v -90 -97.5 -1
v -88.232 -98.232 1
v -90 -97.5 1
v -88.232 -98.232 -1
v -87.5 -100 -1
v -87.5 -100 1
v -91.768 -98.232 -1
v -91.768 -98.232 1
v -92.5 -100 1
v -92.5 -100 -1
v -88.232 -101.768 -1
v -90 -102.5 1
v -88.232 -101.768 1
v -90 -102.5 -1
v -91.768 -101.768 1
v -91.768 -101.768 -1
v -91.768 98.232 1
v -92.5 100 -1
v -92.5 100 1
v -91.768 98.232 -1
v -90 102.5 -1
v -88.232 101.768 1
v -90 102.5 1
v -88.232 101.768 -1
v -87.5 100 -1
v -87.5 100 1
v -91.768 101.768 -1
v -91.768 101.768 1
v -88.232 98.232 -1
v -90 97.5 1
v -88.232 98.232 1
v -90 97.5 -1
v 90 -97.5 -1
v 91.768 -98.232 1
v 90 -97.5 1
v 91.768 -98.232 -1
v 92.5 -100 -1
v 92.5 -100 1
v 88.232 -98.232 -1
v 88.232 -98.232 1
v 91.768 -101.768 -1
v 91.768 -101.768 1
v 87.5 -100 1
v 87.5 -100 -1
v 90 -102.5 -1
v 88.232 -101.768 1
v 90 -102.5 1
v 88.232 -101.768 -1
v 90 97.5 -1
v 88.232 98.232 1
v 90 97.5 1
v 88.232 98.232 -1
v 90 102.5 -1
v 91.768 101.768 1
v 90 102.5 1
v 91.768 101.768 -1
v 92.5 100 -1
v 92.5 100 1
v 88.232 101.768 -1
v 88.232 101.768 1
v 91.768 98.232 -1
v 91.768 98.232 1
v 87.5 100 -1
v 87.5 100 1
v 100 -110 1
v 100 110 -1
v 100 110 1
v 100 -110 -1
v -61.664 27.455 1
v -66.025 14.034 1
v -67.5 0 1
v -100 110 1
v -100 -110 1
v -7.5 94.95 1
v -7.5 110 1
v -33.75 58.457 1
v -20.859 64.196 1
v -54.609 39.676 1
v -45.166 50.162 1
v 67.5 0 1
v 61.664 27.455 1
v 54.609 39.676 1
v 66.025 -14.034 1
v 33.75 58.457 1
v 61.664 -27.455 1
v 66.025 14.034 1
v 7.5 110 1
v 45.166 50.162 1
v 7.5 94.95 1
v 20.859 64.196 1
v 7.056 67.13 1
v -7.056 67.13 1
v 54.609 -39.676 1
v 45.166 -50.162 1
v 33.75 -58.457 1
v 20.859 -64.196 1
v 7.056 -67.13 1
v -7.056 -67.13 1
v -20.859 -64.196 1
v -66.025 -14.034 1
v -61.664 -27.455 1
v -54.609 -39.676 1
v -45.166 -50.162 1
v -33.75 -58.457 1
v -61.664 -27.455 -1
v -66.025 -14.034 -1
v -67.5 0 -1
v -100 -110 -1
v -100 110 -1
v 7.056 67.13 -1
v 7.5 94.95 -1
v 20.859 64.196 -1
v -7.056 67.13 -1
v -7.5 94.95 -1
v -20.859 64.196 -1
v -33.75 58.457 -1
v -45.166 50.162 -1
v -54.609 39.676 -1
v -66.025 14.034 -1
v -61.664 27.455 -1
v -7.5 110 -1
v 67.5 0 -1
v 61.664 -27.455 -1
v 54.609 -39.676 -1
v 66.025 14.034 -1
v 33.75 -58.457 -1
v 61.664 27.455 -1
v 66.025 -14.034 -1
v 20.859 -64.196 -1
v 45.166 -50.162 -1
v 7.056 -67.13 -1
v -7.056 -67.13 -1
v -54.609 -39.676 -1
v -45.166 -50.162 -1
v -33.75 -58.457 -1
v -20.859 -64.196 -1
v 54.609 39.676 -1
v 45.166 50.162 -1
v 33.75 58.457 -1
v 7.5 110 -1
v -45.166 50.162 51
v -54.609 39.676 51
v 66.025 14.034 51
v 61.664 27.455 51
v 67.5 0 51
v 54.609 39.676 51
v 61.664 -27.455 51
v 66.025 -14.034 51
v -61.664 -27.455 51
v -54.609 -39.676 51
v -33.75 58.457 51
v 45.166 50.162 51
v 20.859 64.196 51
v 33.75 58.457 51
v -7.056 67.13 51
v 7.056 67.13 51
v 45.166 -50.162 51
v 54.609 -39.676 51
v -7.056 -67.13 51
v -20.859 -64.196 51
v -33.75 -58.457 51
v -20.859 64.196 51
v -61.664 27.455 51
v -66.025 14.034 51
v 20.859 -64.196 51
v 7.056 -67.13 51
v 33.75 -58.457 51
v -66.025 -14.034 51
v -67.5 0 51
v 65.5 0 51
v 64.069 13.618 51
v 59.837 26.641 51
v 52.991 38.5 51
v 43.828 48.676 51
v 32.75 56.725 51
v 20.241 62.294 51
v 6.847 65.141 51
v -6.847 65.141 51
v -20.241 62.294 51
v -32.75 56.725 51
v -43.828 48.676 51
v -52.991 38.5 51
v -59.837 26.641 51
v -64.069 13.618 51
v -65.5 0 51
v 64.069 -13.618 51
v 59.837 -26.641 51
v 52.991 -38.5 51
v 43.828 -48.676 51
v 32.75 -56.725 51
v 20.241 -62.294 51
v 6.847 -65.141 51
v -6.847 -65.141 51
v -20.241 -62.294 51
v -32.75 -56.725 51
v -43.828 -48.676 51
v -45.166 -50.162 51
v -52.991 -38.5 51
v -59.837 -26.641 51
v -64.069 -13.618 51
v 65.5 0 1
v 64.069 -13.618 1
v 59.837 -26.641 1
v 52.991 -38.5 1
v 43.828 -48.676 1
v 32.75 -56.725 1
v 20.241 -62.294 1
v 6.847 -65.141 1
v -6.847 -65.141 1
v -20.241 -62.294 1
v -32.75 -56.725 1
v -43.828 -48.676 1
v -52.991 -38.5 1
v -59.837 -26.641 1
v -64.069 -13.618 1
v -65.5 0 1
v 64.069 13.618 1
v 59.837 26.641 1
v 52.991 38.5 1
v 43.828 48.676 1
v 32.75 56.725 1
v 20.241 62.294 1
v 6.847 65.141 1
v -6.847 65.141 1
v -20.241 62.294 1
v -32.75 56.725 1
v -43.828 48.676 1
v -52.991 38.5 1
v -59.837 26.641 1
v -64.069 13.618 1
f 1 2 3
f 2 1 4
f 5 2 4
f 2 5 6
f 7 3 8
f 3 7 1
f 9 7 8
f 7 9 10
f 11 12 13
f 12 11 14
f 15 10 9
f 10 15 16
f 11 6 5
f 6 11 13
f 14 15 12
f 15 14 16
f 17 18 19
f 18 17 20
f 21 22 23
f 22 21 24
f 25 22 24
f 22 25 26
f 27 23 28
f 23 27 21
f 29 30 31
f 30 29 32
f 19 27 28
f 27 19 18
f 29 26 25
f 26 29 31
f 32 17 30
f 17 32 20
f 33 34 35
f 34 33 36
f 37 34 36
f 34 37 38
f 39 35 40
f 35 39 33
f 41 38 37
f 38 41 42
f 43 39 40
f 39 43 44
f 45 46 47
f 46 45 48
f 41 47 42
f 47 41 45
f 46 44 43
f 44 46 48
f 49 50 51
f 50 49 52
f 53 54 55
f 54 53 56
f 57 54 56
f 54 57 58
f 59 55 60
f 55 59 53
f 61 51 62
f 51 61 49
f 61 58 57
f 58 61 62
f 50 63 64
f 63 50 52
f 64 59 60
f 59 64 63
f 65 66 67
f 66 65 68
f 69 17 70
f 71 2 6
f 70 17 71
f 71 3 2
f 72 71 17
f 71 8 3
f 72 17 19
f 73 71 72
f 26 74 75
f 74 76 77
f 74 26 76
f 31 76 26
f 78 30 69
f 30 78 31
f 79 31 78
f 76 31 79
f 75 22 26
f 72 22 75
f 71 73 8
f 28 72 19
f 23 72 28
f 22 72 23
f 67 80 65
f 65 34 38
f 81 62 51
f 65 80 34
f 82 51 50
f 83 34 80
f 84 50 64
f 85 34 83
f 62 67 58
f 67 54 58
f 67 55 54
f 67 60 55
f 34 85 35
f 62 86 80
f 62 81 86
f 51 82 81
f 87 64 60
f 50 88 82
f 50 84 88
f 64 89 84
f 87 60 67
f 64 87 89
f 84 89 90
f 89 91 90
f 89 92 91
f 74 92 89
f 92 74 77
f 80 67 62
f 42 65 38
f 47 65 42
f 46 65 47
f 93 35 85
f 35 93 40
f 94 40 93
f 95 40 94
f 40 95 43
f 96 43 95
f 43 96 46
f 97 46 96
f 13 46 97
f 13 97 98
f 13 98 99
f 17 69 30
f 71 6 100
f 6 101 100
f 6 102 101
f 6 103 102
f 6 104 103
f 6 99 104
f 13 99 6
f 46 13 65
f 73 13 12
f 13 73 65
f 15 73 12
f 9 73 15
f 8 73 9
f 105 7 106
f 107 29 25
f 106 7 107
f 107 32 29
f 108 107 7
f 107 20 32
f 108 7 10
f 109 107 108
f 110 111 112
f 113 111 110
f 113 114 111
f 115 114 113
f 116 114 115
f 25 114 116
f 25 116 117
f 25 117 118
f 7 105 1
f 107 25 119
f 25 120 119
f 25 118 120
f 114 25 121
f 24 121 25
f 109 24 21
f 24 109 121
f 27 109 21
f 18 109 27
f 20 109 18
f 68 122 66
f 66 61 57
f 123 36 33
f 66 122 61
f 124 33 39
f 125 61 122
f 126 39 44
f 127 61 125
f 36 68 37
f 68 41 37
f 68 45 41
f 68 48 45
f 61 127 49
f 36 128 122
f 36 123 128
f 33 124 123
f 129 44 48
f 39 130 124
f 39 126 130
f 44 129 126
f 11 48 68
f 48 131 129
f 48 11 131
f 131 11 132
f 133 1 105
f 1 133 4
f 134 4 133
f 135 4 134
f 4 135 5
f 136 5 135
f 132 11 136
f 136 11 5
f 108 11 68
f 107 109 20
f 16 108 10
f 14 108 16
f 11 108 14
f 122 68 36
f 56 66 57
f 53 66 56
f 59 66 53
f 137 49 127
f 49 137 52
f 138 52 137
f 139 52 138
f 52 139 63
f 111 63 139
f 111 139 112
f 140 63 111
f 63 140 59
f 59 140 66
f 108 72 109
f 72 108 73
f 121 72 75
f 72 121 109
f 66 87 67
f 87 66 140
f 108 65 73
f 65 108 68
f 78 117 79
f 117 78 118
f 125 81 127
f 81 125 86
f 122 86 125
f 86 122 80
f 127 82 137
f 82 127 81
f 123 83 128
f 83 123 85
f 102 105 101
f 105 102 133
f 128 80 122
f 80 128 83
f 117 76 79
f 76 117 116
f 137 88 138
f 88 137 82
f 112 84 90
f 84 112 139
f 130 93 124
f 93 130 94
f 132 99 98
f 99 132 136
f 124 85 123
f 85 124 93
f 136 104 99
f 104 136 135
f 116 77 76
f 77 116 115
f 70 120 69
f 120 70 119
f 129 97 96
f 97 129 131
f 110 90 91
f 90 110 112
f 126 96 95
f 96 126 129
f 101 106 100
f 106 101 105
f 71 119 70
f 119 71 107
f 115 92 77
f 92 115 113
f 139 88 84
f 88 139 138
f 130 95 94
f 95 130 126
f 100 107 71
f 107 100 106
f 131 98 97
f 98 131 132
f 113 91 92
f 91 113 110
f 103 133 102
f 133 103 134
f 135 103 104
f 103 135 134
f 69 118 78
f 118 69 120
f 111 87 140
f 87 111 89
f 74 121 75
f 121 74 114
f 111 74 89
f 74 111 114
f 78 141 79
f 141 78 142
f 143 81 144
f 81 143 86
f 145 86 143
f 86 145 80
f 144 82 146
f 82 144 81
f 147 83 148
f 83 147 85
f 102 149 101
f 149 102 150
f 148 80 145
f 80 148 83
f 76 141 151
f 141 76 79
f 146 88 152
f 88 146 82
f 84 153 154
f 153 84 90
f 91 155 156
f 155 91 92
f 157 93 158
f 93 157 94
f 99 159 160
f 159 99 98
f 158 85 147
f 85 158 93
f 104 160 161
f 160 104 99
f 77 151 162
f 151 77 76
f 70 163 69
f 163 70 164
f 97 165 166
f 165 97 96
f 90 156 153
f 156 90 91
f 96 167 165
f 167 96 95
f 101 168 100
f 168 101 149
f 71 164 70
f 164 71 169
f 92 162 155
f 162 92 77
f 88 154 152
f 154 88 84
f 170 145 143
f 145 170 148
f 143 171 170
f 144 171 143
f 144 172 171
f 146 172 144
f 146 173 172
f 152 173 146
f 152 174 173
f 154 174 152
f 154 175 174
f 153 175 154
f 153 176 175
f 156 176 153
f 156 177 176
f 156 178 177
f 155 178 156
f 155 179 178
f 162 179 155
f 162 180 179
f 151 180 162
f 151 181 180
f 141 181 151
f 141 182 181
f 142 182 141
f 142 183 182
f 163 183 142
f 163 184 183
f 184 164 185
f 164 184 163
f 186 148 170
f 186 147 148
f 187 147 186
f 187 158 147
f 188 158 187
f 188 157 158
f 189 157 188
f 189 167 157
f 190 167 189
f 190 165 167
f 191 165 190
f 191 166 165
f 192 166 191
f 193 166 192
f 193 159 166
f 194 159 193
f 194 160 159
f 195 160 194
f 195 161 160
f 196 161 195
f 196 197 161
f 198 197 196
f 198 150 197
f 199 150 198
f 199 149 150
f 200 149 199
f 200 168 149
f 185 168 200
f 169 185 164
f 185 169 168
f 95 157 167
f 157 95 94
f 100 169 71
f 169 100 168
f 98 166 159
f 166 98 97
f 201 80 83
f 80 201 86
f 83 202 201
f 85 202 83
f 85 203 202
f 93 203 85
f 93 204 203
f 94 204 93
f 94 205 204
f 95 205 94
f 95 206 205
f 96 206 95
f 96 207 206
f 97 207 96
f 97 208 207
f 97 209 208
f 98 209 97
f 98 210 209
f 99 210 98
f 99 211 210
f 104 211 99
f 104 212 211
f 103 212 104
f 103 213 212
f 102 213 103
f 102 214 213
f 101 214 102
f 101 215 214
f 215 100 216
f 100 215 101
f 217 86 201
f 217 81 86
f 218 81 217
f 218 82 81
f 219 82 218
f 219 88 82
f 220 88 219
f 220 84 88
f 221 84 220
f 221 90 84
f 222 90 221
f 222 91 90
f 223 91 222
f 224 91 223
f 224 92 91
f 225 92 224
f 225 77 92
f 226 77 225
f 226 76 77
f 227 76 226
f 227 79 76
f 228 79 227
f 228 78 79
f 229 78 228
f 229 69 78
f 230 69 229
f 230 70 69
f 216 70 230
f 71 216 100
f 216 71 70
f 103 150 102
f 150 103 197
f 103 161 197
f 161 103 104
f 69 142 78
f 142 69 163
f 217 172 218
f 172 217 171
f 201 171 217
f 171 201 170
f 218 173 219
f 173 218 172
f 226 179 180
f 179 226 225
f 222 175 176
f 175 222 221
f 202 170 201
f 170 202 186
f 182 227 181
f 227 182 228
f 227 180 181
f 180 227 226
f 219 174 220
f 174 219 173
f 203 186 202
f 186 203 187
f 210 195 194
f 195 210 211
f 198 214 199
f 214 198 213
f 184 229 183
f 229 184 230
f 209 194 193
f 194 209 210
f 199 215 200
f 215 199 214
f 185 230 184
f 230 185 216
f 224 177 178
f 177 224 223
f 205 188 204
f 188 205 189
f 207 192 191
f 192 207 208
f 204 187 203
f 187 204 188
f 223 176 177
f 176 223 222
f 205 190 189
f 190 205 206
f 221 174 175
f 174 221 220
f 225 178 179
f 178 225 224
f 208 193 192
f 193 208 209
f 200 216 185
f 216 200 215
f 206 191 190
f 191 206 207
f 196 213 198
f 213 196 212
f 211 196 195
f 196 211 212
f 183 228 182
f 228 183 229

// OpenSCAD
// Parameters
width = 200;                 // Backplane width
height = 220;                // Backplane height
thickness = 2;               // Backplane and tube wall thickness
hole_radius = 135 / 2;       // Central hole radius
screw_hole_radius = 5 / 2;   // Screw hole radius
screw_hole_margin = 10;      // Distance from edges to screw holes
tube_height = 50;            // Height of the tube
cut_width = 15;              // Width of rectangular cutout
cut_height = 15;             // Height of rectangular cutout

// Backplane with cutouts
difference() {
    cube([width, height, thickness], center = true);  // Main backplane

    cylinder(r = hole_radius, h = thickness + 0.1, center = true);  // Central hole

    // Screw holes in corners
    for (x = [-width/2 + screw_hole_margin, width/2 - screw_hole_margin],
         y = [-height/2 + screw_hole_margin, height/2 - screw_hole_margin]) {
        translate([x, y, 0])
            cylinder(r = screw_hole_radius, h = thickness + 0.1, center = true);
    }

    // Rectangular cutout near top edge
    translate([0, height/2 - cut_height / 2, 0])
        cube([cut_width, cut_height + 0.1, thickness + 0.1], center = true);
}

// Hollow tube aligned with central hole
difference() {
    // Outer tube
    translate([0, 0, tube_height / 2 + thickness / 2])
        cylinder(r = hole_radius, h = tube_height, center = true);

    // Inner hollow
    translate([0, 0, tube_height / 2 + thickness / 2])
        cylinder(r = hole_radius - thickness, h = tube_height + 0.1, center = true);
}
